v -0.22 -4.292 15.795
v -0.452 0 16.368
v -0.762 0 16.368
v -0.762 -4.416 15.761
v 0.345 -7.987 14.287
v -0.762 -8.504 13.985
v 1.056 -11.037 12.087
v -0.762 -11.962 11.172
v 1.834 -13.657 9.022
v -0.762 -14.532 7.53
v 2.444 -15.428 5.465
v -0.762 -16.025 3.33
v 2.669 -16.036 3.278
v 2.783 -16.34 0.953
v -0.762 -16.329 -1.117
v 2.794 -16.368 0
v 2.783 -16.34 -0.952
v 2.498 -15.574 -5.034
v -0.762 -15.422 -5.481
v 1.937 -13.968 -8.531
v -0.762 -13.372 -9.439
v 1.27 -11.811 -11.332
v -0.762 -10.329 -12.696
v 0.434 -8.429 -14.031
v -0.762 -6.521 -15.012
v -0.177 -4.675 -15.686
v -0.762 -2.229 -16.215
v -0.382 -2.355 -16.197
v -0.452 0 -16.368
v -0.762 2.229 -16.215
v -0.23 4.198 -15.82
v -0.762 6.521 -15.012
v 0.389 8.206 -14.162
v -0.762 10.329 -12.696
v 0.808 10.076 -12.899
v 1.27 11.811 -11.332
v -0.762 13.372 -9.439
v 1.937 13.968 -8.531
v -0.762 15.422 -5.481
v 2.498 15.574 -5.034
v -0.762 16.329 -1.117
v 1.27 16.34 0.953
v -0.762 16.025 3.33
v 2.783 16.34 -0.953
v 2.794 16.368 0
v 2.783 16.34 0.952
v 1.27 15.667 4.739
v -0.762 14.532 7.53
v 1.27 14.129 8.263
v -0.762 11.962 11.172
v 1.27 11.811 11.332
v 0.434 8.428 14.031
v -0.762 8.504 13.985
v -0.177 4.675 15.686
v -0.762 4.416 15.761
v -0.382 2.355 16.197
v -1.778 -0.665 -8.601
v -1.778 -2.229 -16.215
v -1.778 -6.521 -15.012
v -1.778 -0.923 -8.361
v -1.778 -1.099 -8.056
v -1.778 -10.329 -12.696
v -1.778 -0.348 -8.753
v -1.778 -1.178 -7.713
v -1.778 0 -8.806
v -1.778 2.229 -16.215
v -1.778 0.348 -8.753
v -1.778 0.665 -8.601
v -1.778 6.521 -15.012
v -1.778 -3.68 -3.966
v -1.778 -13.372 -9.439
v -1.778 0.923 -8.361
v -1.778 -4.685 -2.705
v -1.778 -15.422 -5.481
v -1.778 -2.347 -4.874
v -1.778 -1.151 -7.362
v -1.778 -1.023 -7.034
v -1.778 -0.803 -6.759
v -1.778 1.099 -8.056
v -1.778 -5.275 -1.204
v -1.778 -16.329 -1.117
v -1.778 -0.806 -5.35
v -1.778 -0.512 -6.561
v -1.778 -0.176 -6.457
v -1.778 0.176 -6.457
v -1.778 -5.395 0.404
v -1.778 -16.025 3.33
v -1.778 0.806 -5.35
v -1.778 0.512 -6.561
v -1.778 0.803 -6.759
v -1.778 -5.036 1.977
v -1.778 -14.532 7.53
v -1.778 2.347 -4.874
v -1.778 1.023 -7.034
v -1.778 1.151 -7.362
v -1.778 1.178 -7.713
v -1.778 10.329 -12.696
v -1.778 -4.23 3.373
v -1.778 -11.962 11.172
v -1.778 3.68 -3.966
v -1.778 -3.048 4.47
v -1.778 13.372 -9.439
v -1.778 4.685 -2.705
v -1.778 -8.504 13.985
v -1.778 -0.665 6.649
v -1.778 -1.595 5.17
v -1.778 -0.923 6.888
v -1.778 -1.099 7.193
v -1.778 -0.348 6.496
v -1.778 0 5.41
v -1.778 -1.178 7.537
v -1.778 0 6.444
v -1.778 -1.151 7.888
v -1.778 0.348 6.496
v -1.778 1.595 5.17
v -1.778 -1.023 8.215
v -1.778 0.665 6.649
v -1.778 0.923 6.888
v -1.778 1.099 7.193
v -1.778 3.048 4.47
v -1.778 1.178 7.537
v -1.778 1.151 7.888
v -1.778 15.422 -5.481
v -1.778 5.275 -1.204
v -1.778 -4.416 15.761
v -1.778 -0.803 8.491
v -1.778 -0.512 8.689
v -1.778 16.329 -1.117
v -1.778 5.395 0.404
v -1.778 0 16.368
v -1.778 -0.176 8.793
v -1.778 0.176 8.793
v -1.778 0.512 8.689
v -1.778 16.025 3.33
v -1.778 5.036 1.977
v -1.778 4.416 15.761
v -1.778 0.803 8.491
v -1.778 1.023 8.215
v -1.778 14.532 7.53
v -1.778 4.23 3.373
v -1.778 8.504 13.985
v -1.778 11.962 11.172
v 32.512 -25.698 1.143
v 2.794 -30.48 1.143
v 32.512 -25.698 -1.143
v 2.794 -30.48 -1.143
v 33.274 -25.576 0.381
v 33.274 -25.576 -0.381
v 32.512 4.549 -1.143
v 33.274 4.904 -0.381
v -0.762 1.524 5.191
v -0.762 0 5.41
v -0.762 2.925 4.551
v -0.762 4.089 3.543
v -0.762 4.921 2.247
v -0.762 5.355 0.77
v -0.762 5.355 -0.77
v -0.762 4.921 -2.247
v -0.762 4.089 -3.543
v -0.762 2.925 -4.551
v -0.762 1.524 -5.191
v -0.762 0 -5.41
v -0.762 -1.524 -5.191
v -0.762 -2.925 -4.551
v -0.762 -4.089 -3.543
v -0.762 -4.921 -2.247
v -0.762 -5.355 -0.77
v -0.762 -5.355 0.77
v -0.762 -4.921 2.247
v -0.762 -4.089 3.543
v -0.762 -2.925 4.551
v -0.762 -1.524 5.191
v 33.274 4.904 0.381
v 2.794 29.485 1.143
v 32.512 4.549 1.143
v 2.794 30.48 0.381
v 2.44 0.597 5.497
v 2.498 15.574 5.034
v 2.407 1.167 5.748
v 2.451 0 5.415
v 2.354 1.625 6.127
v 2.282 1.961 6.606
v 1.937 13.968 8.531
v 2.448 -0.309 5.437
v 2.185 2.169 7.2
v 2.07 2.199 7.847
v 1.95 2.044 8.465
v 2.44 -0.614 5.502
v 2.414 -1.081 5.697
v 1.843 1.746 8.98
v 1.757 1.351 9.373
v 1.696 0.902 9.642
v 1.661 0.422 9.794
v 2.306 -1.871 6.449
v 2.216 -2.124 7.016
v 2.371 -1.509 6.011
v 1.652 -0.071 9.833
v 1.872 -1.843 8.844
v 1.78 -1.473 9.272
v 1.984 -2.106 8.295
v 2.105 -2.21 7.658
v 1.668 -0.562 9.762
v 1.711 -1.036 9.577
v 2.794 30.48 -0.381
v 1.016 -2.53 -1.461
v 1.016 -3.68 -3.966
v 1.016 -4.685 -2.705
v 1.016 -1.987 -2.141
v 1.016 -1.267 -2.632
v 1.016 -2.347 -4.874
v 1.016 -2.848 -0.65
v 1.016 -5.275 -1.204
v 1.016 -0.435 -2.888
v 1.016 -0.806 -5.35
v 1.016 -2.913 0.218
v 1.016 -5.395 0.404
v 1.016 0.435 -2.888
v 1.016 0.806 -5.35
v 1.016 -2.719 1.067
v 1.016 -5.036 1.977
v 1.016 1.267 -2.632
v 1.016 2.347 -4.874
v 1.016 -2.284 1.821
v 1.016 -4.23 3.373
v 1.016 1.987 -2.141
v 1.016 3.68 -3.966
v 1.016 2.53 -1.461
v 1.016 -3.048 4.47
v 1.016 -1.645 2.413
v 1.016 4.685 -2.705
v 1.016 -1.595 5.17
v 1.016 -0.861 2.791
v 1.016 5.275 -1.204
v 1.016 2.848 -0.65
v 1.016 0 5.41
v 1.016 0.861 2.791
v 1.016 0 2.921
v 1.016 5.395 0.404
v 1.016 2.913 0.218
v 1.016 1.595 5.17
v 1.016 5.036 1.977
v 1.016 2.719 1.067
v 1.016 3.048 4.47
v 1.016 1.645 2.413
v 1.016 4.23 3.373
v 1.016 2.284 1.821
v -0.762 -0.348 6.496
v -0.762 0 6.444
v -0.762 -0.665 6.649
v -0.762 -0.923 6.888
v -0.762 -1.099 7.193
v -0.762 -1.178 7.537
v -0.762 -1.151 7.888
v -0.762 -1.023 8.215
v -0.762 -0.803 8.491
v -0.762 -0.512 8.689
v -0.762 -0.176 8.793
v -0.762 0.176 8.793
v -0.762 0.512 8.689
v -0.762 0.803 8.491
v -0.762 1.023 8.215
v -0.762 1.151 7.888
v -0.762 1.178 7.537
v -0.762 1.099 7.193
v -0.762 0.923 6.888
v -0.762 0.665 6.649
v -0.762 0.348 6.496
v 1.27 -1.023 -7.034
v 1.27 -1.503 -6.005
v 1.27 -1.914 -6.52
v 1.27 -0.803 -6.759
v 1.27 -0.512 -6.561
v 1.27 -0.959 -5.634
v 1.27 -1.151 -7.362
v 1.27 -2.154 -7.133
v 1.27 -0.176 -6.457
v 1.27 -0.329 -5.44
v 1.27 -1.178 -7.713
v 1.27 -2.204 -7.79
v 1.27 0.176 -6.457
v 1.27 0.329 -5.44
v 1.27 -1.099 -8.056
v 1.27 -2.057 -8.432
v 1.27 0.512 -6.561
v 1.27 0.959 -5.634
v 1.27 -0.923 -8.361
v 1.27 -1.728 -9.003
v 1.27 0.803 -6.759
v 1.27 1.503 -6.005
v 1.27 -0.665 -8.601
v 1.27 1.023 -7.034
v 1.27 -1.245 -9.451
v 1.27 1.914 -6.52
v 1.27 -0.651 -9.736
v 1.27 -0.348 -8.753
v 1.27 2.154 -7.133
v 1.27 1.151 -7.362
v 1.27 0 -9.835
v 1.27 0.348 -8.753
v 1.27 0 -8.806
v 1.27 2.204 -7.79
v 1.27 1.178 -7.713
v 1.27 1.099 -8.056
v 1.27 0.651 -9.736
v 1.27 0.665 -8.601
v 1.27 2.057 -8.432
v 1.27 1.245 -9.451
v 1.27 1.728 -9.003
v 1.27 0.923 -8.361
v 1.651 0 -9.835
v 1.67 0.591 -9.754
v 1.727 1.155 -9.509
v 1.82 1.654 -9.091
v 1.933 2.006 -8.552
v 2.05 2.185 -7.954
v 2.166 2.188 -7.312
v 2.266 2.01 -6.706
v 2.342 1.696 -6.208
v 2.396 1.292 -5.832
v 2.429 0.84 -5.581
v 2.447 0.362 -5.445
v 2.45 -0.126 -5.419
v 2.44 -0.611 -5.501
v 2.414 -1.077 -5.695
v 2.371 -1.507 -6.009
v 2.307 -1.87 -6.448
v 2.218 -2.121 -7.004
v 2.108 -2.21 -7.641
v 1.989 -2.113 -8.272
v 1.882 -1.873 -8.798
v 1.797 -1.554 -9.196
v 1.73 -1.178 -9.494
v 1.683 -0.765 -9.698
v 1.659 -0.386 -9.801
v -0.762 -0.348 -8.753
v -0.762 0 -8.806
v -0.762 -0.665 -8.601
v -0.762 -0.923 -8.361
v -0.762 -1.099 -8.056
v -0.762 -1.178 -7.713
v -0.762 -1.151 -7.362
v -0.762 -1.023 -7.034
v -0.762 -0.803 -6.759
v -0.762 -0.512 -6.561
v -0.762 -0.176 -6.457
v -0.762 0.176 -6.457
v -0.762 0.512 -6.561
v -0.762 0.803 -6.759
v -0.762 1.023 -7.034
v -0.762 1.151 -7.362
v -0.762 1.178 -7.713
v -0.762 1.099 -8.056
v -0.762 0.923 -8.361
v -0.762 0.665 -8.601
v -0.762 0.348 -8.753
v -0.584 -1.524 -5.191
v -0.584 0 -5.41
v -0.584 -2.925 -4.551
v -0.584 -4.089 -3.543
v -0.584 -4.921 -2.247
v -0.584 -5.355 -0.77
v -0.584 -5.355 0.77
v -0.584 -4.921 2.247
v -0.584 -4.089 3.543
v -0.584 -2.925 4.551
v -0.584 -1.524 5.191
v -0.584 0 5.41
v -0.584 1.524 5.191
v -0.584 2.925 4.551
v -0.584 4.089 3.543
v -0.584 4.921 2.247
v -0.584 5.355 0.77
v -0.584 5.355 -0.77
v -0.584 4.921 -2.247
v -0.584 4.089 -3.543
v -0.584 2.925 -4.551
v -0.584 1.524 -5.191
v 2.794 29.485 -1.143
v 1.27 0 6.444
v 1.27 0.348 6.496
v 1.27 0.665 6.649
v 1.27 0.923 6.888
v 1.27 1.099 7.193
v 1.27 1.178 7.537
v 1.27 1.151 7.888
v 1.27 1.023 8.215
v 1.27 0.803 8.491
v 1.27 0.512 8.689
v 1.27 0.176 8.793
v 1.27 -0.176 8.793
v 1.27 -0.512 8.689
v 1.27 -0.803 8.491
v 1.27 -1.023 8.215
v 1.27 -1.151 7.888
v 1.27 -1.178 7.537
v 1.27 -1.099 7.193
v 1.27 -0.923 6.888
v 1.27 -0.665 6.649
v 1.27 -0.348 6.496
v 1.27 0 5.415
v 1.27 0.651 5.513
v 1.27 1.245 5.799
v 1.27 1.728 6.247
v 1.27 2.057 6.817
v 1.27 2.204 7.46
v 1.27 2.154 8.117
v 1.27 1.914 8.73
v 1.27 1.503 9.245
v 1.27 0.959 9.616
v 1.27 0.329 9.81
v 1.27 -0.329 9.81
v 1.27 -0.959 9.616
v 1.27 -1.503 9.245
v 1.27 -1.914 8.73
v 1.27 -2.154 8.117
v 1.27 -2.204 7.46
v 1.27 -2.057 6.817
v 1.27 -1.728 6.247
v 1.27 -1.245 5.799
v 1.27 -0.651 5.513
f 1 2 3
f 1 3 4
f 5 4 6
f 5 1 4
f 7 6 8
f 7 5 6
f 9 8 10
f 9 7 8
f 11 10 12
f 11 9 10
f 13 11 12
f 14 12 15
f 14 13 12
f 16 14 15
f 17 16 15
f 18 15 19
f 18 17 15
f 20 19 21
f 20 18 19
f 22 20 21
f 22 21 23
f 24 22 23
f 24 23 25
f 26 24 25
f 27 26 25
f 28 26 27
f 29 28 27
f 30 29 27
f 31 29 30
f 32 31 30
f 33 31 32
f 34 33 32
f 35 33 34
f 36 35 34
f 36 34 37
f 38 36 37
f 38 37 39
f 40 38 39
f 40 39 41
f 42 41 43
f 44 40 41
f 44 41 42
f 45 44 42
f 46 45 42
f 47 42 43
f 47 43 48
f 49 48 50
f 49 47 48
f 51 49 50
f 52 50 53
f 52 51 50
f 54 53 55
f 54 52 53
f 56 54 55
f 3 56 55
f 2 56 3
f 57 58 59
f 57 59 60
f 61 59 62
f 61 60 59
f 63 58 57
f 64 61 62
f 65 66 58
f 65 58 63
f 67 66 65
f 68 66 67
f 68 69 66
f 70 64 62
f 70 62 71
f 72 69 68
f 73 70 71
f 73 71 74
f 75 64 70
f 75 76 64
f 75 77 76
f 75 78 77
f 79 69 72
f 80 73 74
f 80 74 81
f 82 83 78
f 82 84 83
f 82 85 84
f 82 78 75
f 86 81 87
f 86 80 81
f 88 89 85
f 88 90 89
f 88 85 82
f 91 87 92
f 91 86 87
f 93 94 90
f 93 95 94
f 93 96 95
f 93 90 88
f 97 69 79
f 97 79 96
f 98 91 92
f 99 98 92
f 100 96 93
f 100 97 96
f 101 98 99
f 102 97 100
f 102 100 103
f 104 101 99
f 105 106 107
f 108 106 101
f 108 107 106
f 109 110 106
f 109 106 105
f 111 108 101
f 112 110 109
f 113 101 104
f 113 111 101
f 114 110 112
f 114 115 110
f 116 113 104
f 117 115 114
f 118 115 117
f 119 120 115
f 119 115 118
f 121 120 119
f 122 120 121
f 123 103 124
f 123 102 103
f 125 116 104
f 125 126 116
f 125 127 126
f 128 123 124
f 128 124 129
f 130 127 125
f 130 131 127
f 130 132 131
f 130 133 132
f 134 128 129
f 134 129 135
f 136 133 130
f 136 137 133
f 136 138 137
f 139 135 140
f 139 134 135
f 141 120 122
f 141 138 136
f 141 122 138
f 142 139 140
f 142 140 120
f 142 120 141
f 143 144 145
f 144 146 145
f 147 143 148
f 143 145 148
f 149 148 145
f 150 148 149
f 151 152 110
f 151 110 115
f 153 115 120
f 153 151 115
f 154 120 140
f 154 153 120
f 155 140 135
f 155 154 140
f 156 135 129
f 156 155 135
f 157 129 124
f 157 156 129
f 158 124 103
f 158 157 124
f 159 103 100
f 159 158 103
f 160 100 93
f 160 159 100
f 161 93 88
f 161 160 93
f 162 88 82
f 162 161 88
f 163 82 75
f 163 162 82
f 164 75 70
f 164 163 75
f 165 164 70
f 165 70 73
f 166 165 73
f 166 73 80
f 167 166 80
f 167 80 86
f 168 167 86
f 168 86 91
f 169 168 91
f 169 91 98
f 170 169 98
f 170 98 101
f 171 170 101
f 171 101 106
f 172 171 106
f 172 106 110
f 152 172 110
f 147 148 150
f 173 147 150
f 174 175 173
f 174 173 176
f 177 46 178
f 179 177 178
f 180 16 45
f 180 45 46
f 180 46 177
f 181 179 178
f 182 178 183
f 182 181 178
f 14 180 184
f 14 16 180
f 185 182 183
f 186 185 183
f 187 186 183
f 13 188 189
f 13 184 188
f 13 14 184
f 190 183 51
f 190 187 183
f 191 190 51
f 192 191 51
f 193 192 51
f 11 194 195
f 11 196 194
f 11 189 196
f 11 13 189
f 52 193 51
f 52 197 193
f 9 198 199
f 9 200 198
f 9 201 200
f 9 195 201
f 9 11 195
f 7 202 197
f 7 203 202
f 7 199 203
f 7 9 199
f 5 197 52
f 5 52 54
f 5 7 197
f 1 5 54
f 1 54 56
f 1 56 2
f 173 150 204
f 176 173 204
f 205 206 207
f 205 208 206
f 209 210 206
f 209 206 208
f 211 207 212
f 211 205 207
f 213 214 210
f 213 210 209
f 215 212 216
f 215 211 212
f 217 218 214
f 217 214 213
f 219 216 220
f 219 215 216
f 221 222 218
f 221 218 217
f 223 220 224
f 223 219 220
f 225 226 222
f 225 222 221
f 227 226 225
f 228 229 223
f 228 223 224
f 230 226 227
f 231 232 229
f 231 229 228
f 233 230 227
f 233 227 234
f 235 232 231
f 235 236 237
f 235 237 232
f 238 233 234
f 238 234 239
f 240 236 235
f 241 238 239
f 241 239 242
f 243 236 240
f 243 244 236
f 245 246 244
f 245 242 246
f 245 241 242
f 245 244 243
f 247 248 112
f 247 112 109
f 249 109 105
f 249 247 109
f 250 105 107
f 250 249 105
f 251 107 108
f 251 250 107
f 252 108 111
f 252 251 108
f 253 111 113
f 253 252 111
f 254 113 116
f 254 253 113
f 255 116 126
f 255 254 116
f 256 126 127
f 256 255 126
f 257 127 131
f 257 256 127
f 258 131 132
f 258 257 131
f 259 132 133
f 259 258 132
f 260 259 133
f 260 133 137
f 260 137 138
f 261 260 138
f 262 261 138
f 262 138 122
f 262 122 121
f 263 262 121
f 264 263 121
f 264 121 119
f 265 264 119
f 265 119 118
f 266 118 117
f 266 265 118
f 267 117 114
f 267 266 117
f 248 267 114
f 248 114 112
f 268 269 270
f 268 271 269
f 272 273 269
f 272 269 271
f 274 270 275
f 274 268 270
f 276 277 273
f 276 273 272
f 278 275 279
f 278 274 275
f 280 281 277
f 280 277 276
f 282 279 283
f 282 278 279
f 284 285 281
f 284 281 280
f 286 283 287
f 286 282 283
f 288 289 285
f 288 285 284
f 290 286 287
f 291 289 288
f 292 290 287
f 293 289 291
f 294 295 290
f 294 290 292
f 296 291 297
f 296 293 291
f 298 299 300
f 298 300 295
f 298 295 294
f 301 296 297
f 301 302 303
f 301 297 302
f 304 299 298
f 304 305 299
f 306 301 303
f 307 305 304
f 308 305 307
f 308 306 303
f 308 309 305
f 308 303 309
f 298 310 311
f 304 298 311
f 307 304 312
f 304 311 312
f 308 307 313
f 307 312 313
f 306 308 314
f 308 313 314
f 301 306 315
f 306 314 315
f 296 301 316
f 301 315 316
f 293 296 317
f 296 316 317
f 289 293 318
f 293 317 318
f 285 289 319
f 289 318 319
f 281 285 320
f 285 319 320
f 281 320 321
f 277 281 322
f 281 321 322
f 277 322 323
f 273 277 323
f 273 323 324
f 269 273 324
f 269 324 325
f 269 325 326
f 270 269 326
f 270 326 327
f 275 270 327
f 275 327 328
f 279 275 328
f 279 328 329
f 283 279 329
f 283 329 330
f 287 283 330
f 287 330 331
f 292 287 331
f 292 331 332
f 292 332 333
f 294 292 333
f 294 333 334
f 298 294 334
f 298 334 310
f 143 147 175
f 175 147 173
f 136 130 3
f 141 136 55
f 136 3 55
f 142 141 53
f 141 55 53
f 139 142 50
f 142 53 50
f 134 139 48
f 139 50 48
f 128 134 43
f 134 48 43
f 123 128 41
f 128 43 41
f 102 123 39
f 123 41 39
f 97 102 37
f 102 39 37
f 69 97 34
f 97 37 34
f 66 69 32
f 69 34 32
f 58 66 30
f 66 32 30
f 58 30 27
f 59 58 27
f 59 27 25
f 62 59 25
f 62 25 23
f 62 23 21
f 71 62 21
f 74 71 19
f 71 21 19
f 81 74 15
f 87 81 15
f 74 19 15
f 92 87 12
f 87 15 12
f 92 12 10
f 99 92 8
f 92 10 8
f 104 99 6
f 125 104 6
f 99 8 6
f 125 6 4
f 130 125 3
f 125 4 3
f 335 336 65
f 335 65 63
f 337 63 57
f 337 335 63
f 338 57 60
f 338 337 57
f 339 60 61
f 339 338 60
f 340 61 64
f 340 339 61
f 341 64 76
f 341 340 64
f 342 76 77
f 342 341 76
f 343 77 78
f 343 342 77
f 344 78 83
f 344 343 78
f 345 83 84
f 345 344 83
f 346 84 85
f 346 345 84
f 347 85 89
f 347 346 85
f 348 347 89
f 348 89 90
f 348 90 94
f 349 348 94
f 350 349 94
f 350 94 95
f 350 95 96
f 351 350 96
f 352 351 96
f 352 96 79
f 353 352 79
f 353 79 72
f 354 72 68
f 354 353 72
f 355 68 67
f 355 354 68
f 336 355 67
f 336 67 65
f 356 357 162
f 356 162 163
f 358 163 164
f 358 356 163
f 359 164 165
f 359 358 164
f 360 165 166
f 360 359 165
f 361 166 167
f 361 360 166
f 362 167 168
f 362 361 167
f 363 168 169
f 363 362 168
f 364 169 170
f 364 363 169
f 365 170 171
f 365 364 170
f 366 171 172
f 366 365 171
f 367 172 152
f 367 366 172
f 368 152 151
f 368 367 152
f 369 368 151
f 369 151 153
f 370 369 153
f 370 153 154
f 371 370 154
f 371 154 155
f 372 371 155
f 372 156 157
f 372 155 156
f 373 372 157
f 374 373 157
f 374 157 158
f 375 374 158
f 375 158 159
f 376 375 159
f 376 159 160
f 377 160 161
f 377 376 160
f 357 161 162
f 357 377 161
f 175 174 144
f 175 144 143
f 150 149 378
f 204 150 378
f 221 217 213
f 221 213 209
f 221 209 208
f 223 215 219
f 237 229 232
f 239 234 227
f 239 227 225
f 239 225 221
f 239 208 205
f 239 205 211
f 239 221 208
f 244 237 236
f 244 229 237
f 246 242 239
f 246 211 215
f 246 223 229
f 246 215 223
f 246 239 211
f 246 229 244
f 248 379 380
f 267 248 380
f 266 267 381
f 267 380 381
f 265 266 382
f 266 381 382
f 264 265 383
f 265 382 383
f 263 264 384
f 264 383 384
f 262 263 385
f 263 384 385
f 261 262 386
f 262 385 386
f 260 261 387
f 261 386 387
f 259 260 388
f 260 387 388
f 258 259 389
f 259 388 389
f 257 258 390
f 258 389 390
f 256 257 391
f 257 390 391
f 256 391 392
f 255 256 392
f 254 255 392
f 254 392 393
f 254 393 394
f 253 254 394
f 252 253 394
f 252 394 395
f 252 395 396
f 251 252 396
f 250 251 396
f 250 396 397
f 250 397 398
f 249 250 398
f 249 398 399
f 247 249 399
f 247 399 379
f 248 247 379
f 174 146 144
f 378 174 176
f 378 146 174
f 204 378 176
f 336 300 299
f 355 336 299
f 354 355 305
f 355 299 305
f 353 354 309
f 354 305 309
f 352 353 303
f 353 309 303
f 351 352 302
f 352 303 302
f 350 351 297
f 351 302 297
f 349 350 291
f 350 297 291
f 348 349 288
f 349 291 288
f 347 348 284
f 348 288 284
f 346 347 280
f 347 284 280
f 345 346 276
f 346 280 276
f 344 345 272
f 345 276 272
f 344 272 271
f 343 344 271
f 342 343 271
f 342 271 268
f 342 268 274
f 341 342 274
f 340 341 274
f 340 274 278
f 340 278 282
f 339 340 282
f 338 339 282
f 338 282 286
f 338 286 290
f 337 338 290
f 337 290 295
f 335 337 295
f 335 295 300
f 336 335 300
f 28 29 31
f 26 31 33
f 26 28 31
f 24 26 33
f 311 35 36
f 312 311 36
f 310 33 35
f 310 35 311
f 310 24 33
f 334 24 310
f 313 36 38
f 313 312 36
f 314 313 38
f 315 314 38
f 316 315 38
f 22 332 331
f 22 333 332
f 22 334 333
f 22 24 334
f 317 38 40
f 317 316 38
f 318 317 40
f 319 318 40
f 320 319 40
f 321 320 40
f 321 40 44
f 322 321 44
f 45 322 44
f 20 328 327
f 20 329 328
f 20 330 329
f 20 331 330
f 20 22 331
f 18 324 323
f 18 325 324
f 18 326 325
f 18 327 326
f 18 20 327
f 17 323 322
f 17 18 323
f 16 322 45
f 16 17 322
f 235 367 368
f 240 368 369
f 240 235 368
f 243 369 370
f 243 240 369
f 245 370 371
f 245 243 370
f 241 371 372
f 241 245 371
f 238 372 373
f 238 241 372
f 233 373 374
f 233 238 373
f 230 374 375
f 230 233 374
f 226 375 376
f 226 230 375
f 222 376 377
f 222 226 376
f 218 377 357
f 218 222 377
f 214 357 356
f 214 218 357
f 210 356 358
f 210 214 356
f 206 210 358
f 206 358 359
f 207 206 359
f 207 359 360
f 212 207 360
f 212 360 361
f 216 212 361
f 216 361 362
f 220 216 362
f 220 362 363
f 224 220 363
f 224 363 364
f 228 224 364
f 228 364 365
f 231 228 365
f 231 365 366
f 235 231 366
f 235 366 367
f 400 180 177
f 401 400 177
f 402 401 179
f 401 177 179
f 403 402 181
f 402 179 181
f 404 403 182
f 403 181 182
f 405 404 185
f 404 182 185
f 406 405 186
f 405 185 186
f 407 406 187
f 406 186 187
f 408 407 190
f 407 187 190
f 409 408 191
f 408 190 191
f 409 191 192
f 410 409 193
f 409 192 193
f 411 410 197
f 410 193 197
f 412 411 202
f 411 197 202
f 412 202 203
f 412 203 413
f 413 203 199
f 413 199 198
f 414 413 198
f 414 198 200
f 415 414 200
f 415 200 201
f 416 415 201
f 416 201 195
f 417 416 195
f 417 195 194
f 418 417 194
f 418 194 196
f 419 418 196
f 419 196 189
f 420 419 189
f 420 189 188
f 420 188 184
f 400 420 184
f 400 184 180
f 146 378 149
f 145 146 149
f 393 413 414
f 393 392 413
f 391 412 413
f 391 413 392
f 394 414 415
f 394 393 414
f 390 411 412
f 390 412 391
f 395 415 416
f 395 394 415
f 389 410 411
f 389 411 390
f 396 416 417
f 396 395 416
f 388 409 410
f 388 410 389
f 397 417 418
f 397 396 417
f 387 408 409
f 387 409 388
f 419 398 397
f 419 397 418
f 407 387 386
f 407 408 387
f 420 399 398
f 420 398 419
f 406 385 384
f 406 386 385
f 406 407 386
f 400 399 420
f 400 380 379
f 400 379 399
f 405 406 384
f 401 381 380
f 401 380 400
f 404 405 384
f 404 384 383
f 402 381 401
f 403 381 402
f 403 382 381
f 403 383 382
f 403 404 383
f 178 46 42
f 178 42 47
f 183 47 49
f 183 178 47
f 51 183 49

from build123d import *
from build123d.topology import SkipClean

# Parameters (mm, degrees)
SKETCH13_R               = 16.367500031
BOSS_EXTRUDE11_DEPTH     = 0.762
SKETCH14_R               = 16.367500031
BOSS_EXTRUDE12_DEPTH     = 0.508
BOSS_EXTRUDE13_DEPTH     = 0.9525
CHAMFER6_SIZE            = 0.762
BOSS_EXTRUDE19_DEPTH     = 1.016
BOSS_EXTRUDE20_START     = 1.524
BOSS_EXTRUDE20_DEPTH     = 1.524
SKETCH28_R               = 2.2098
CUT_EXTRUDE9_DEPTH       = 1.524
SKETCH29_R               = 1.1811
CUT_EXTRUDE10_DEPTH      = 14.224
CUT_EXTRUDE15_START      = 52.832
SKETCH35_R               = 16.367500031
CUT_EXTRUDE15_DEPTH      = 52.832
CUT_EXTRUDE16_DEPTH      = 52.832
CUT_EXTRUDE16_DEPTH_BACK = 52.832
SKETCH36_R               = 29.172390064
SKETCH36_R_2             = 16.367500031
CUT_EXTRUDE17_DEPTH      = 52.832
CUT_EXTRUDE17_DEPTH_BACK = 52.832
BOSS_EXTRUDE21_DEPTH     = 1.143
CHAMFER7_SIZE            = 0.762
SKETCH41_R               = 2.921
CUT_EXTRUDE19_DEPTH      = 1.524
SKETCH42_R               = 4.064
CUT_EXTRUDE20_DEPTH      = 0.762
SKETCH43_R               = 2.921
CUT_EXTRUDE21_DEPTH      = 0.508
CUT_EXTRUDE24_DEPTH      = 0.9398
CUT_EXTRUDE24_DEPTH_BACK = 0.9398
SKETCH44_R               = 5.4102
SKETCH46_R               = 2.921
CUT_EXTRUDE25_DEPTH      = 0.508
SKETCH47_R               = 16.367500031
SKETCH47_R_2             = 1.1811
SKETCH47_R_3             = 5.4102
BOSS_EXTRUDE22_DEPTH     = 1.016
BOSS_EXTRUDE23_START     = 1.524
SKETCH48_R               = 5.4102
SKETCH48_R_2             = 2.921
BOSS_EXTRUDE23_DEPTH     = 1.524
BOSS_EXTRUDE24_START     = 0.762
SKETCH49_R               = 2.921
BOSS_EXTRUDE24_DEPTH     = 0.762
CUT_EXTRUDE26_START      = -1.6002
SKETCH51_R               = 5.4102
CUT_EXTRUDE26_DEPTH      = 1.6002


with BuildPart() as part:
    # Sketch13 → Boss-Extrude11 (new, symmetric)
    with BuildSketch(Plane(origin=(0, 0, 0), x_dir=(0, 0, -1), z_dir=(1, 0, 0))):
        with Locations(Location((0, 0, 0), (0, 0, 180))):
            Circle(SKETCH13_R)
        with BuildLine():
            Line((-2.621749746, -2.242527206), (-1.817157123, -14.183327087))
            ThreePointArc((-1.817157123, -14.183327087), (0.203701313, -16.048707293), (2.176562947, -14.132636025))
            Line((2.176562947, -14.132636025), (2.677823379, -2.175261352))
            ThreePointArc((2.677823379, -2.175261352), (-0.043786264, 3.449722128), (-2.621749746, -2.242527206))
        make_face(mode=Mode.SUBTRACT)
    extrude(amount=BOSS_EXTRUDE11_DEPTH, both=True)

    # Sketch14 → Boss-Extrude12 (add, symmetric)
    with BuildSketch(Plane(origin=(0.762, 0, 0), x_dir=(0, 0, -1), z_dir=(1, 0, 0))):
        with Locations(Location((0, 0, 0), (0, 0, 180))):
            Circle(SKETCH14_R)
    extrude(amount=BOSS_EXTRUDE12_DEPTH, both=True)

    # Sketch15 → Boss-Extrude13 (add, symmetric)
    with BuildSketch(Plane.XY):
        Polygon((1.27, 0), (1.27, 25.4), (26.67, 4.086869368), (26.67, -21.313130632), (1.27, -25.4), align=None)
    extrude(amount=BOSS_EXTRUDE13_DEPTH, both=True)

    # Chamfer6
    chamfer6_edges = [part.edges().sort_by_distance(p)[0] for p in [
        (26.67, -8.613130632, -0.9525),
        (13.97, 14.743434684, -0.9525),
        (26.67, -8.613130632, 0.9525),
        (13.97, 14.743434684, 0.9525),
    ]]
    chamfer(chamfer6_edges, length=CHAMFER6_SIZE)

    # Sketch26 → Boss-Extrude19 (add)
    with BuildSketch(Plane.ZY.offset(-0.254)):
        with BuildLine():
            Line((-2.677823379, -2.175261352), (-2.176562947, -14.132636025))
            ThreePointArc((-2.176562947, -14.132636025), (-0.203701313, -16.048707293), (1.817157123, -14.183327087))
            Line((1.817157123, -14.183327087), (2.621749746, -2.242527206))
            ThreePointArc((2.621749746, -2.242527206), (0.043786264, 3.449722128), (-2.677823379, -2.175261352))
        make_face()
    extrude(amount=BOSS_EXTRUDE19_DEPTH)

    # Sketch27 → Boss-Extrude20 (add)
    with BuildSketch(Plane(origin=(1.27, 0, 0), x_dir=(0, 0, -1), z_dir=(1, 0, 0)).offset(BOSS_EXTRUDE20_START)):
        with BuildLine():
            Line((0.9525, 16.339761351), (0.9525, -16.339761351))
            ThreePointArc((0.9525, -16.339761351), (16.367500031, 0), (0.9525, 16.339761351))
        make_face()
        with BuildLine():
            Line((-0.9525, -16.339761351), (-0.9525, 16.339761351))
            ThreePointArc((-0.9525, 16.339761351), (-16.367500031, 0), (-0.9525, -16.339761351))
        make_face()
    extrude(amount=-BOSS_EXTRUDE20_DEPTH)

    # Sketch28 → Cut-Extrude9 (cut)
    with BuildSketch(Plane(origin=(2.794, 0, 0), x_dir=(0, 0, -1), z_dir=(1, 0, 0))):
        with Locations((-7.624820031, 0)):
            Circle(SKETCH28_R)
        with Locations((7.624820031, 0)):
            Circle(SKETCH28_R)
    extrude(amount=-CUT_EXTRUDE9_DEPTH, mode=Mode.SUBTRACT)

    # Sketch29 → Cut-Extrude10 (cut)
    with BuildSketch(Plane(origin=(1.27, 0, 0), x_dir=(0, 0, -1), z_dir=(1, 0, 0))):
        with Locations((-7.624820031, 0)):
            Circle(SKETCH29_R)
        with Locations((7.624820031, 0)):
            Circle(SKETCH29_R)
    extrude(amount=-CUT_EXTRUDE10_DEPTH, mode=Mode.SUBTRACT)

    # Sketch35 → Cut-Extrude15 (cut)
    with BuildSketch(Plane(origin=(2.794, 0, 0), x_dir=(0, 0, -1), z_dir=(1, 0, 0)).offset(CUT_EXTRUDE15_START)):
        with Locations(Location((0, 0, 0), (0, 0, 266.663810568))):
            Circle(SKETCH35_R)
    extrude(amount=-CUT_EXTRUDE15_DEPTH, mode=Mode.SUBTRACT)

    # Sketch36 → Cut-Extrude16 (cut, two sides: drawn at the far end of the back side and taken through both)
    with SkipClean():  # the faces are left unmerged after this step: merging them gives an invalid solid
        with BuildSketch(Plane(origin=(2.794, 0, 0), x_dir=(0, 0, -1), z_dir=(1, 0, 0)).offset(-CUT_EXTRUDE16_DEPTH_BACK)):
            Circle(SKETCH36_R)
            with Locations(Location((0, 0, 0), (0, 0, 180))):
                Circle(SKETCH36_R_2, mode=Mode.SUBTRACT)
        extrude(amount=CUT_EXTRUDE16_DEPTH + CUT_EXTRUDE16_DEPTH_BACK, mode=Mode.SUBTRACT)
    add(part.part.scale(1), mode=Mode.REPLACE)  # the faces are merged on a copy

    # Sketch33 → Cut-Extrude17 (cut, two sides: drawn at the far end of the back side and taken through both)
    with SkipClean():  # the faces are left unmerged after this step: merging them gives an invalid solid
        with BuildSketch(Plane(origin=(0, 0, 0), x_dir=(1, 0, 0), z_dir=(0, 1, 0)).offset(-CUT_EXTRUDE17_DEPTH_BACK)):
            with BuildLine():
                ThreePointArc((2.794, 0), (1.974703997, -8.34312313), (-0.451883084, -16.367500031))
                Line((-0.451883084, -16.367500031), (2.794, -16.367500031))
                Line((2.794, -16.367500031), (2.794, 0))
            make_face()
            with BuildLine():
                Line((2.794, 16.367500031), (-0.451883084, 16.367500031))
                ThreePointArc((-0.451883084, 16.367500031), (1.974703997, 8.34312313), (2.794, 0))
                Line((2.794, 0), (2.794, 16.367500031))
            make_face()
        extrude(amount=CUT_EXTRUDE17_DEPTH + CUT_EXTRUDE17_DEPTH_BACK, mode=Mode.SUBTRACT)
    add(part.part.scale(1), mode=Mode.REPLACE)  # the faces are merged on a copy

    # Sketch41 → Cut-Extrude19 (cut)
    with SkipClean():  # the faces are left unmerged after this step: merging them gives an invalid solid
        with BuildSketch(Plane.ZY.offset(0.762)):
            Circle(SKETCH41_R)
        extrude(amount=-CUT_EXTRUDE19_DEPTH, mode=Mode.SUBTRACT)

    # Sketch42 → Cut-Extrude20 (cut, symmetric)
    with SkipClean():  # the faces are left unmerged after this step: merging them gives an invalid solid
        with BuildSketch(Plane.ZY.offset(0.762)):
            Circle(SKETCH42_R)
        extrude(amount=CUT_EXTRUDE20_DEPTH, both=True, mode=Mode.SUBTRACT)

    # Sketch43 → Cut-Extrude21 (cut, symmetric)
    with SkipClean():  # the faces are left unmerged after this step: merging them gives an invalid solid
        with BuildSketch(Plane.ZY.offset(-0.762)):
            Circle(SKETCH43_R)
        extrude(amount=CUT_EXTRUDE21_DEPTH, both=True, mode=Mode.SUBTRACT)

    # Sketch44 → Cut-Extrude24 (cut, two sides: drawn at the far end of the back side and taken through both)
    with SkipClean():  # the faces are left unmerged after this step: merging them gives an invalid solid
        with BuildSketch(Plane.ZY.offset(-CUT_EXTRUDE24_DEPTH_BACK)):
            with Locations(Location((0, 0, 0), (0, 0, 180))):
                Circle(SKETCH44_R)
        extrude(amount=CUT_EXTRUDE24_DEPTH + CUT_EXTRUDE24_DEPTH_BACK, mode=Mode.SUBTRACT)

    # Sketch46 → Cut-Extrude25 (cut)
    with SkipClean():  # the faces are left unmerged after this step: merging them gives an invalid solid
        with BuildSketch(Plane.ZY.offset(-1.27)):
            Circle(SKETCH46_R)
        extrude(amount=-CUT_EXTRUDE25_DEPTH, mode=Mode.SUBTRACT)

    # Sketch47 → Boss-Extrude22 (add)
    with SkipClean():  # the faces are left unmerged after this step: merging them gives an invalid solid
        with BuildSketch(Plane.ZY.offset(0.762)):
            Circle(SKETCH47_R)
            with Locations(Location((7.624820031, 0, 0), (0, 0, 180))):
                Circle(SKETCH47_R_2, mode=Mode.SUBTRACT)
            with Locations(Location((-7.624820031, 0, 0), (0, 0, 180))):
                Circle(SKETCH47_R_2, mode=Mode.SUBTRACT)
            Circle(SKETCH47_R_3, mode=Mode.SUBTRACT)
        extrude(amount=BOSS_EXTRUDE22_DEPTH)

    # Sketch48 → Boss-Extrude23 (add)
    with SkipClean():  # the faces are left unmerged after this step: merging them gives an invalid solid
        with BuildSketch(Plane.ZY.offset(-0.9398).offset(BOSS_EXTRUDE23_START)):
            Circle(SKETCH48_R)
            Circle(SKETCH48_R_2, mode=Mode.SUBTRACT)
        extrude(amount=-BOSS_EXTRUDE23_DEPTH)

    # Sketch49 → Boss-Extrude24 (add)
    with SkipClean():  # the faces are left unmerged after this step: merging them gives an invalid solid
        with BuildSketch(Plane.ZY.offset(-1.778).offset(BOSS_EXTRUDE24_START)):
            Circle(SKETCH49_R)
        extrude(amount=-BOSS_EXTRUDE24_DEPTH)

    # Sketch51 → Cut-Extrude26 (cut)
    with SkipClean():  # the faces are left unmerged after this step: merging them gives an invalid solid
        with BuildSketch(Plane.ZY.offset(0.5842).offset(CUT_EXTRUDE26_START)):
            Circle(SKETCH51_R)
        extrude(amount=CUT_EXTRUDE26_DEPTH, mode=Mode.SUBTRACT)


with BuildPart() as body_2:
    # Sketch38 → Boss-Extrude21 (new, symmetric)
    with BuildSketch(Plane(origin=(0, 0, 0), x_dir=(-1, 0, 0), z_dir=(0, 0, -1))):
        Polygon((-33.274, 4.904243242), (-2.794, 30.48), (-2.794, 0), (-2.794, -30.48), (-33.274, -25.575756758), align=None)
    extrude(amount=BOSS_EXTRUDE21_DEPTH, both=True)

    # Chamfer7
    chamfer7_edges = [body_2.edges().sort_by_distance(p)[0] for p in [
        (33.274, -10.335756758, -1.143),
        (18.034, 17.692121621, -1.143),
        (33.274, -10.335756758, 1.143),
        (18.034, 17.692121621, 1.143),
    ]]
    chamfer(chamfer7_edges, length=CHAMFER7_SIZE)


solid = Compound([part.part, body_2.part])
